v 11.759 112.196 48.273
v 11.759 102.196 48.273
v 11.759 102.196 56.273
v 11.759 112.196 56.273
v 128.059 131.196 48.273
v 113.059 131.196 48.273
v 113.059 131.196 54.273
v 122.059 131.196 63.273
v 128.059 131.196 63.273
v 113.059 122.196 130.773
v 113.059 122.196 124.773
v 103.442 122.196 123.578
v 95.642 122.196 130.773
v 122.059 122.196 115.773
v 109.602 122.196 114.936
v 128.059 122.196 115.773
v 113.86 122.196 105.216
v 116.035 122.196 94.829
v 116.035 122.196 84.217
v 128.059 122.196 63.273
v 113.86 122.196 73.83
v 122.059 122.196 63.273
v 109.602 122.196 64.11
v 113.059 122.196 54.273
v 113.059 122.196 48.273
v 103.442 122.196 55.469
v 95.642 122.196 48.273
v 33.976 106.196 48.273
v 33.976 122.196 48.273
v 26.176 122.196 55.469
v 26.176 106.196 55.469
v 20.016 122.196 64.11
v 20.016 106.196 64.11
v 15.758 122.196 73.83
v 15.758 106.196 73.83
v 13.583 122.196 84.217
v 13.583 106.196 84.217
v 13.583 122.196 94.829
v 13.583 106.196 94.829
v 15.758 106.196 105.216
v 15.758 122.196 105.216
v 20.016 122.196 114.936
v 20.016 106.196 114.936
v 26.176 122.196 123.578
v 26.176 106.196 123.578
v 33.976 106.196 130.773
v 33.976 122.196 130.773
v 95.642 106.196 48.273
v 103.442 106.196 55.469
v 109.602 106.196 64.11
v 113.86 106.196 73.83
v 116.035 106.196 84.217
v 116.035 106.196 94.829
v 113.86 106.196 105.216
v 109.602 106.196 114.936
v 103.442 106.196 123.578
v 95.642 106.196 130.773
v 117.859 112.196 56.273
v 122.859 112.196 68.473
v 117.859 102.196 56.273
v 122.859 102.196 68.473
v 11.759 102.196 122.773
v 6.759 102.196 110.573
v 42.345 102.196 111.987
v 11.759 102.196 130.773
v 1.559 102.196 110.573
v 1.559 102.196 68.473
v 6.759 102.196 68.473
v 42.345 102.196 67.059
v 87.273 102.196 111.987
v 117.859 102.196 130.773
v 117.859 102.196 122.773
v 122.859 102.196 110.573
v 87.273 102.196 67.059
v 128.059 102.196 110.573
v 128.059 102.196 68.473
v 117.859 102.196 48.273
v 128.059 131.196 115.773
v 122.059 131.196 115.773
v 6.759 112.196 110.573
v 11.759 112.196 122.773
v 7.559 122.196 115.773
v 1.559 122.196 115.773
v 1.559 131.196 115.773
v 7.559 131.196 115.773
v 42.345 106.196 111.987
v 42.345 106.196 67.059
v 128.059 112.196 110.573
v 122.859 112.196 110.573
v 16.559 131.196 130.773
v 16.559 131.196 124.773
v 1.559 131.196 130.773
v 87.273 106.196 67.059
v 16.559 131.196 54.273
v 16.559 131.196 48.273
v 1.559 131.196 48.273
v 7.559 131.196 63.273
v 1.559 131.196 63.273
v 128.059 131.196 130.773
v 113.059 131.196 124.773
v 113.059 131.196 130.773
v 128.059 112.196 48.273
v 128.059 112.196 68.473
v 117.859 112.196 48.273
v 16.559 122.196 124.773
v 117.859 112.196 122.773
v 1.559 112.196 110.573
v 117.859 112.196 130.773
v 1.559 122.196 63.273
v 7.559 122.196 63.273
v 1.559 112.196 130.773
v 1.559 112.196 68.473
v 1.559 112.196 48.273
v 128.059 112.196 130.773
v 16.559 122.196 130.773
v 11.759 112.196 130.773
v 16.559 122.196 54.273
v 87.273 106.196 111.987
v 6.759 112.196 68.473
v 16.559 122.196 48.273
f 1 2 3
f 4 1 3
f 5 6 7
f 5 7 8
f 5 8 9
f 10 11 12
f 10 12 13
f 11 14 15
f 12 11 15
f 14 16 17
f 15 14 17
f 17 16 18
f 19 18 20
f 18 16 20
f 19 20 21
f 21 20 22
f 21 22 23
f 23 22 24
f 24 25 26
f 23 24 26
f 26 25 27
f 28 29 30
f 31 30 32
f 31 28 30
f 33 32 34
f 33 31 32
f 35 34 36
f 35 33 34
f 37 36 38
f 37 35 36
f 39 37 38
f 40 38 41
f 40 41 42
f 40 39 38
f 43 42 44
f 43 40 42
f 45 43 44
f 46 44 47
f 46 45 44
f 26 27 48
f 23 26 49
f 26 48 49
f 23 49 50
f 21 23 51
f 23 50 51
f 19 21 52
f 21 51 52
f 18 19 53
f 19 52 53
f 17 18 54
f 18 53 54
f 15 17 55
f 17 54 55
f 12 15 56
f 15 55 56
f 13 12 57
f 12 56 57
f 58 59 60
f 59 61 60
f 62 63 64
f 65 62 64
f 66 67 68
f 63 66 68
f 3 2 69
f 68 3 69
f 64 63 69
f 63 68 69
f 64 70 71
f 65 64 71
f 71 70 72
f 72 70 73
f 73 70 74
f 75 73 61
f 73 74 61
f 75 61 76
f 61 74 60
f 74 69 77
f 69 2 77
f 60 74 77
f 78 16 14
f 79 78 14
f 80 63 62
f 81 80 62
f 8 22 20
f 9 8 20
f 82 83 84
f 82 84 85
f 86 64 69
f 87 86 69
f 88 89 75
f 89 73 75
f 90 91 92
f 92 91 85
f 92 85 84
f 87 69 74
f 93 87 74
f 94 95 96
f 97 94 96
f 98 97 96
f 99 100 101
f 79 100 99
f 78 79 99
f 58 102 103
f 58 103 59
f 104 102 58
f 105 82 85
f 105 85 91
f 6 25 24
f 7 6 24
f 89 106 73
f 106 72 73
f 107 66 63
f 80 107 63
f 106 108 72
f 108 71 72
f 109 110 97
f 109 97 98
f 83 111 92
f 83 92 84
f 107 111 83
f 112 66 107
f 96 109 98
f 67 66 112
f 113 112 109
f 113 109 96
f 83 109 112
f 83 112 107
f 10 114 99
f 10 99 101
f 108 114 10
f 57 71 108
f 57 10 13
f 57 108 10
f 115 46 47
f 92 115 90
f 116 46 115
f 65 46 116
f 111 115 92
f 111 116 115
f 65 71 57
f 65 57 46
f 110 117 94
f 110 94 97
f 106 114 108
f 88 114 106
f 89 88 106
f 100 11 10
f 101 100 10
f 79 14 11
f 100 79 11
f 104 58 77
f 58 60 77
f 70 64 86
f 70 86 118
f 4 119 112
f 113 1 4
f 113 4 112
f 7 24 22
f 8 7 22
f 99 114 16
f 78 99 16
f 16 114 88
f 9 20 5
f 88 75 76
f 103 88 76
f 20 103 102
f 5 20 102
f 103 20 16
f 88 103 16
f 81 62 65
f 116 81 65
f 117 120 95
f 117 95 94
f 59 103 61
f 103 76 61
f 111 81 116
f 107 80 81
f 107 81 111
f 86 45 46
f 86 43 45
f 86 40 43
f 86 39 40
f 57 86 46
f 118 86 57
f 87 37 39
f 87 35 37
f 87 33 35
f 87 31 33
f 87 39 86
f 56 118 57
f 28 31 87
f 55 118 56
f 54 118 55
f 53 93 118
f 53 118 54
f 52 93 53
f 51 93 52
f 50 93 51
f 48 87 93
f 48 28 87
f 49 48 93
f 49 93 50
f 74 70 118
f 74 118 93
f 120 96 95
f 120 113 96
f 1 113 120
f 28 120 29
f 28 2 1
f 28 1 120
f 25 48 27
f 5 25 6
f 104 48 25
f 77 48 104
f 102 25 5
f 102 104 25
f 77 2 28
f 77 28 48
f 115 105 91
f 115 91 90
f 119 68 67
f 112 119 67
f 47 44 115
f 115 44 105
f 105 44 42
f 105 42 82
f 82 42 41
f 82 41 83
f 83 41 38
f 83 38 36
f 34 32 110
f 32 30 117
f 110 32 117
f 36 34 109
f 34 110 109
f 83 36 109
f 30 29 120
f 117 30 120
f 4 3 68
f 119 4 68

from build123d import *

# Parameters (mm, degrees)
SKETCH_1_W      = 44.92820323
SKETCH_1_H      = 44.928203231
EXTRUDE_1_DEPTH = 4
EXTRUDE_2_DEPTH = 6
EXTRUDE_3_DEPTH = 10
EXTRUDE_4_DEPTH = 9


with BuildPart() as part:
    # Эскиз1 → Бобышка-Вытянуть1 (new body)
    with BuildSketch(Plane(origin=(0, 102.195974268, 0), x_dir=(1, 0, 0), z_dir=(0, 1, 0))):
        Polygon((6.758980694, -68.473129836), (1.558980694, -68.473129836), (1.558980694, -110.573129836), (6.758980694, -110.573129836), (11.758980694, -122.773129836), (11.758980694, -130.773129836), (117.858980694, -130.773129836), (117.858980694, -122.773129836), (122.858980694, -110.573129836), (128.058980694, -110.573129836), (128.058980694, -68.473129836), (122.858980694, -68.473129836), (117.858980694, -56.273129836), (117.858980694, -48.273129836), (11.758980694, -48.273129836), (11.758980694, -56.273129836), align=None)
        with Locations((64.808980694, -89.523129837)):
            Rectangle(SKETCH_1_W, SKETCH_1_H, mode=Mode.SUBTRACT)
    extrude(amount=EXTRUDE_1_DEPTH)

    # Эскиз2 → Бобышка-Вытянуть2 (add)
    with BuildSketch(Plane(origin=(0, 106.195974268, 0), x_dir=(1, 0, 0), z_dir=(0, 1, 0))):
        with BuildLine():
            Line((95.642201414, -130.773129836), (117.858980694, -130.773129836))
            Line((117.858980694, -130.773129836), (117.858980694, -122.773129836))
            Line((117.858980694, -122.773129836), (122.858980694, -110.573129836))
            Line((122.858980694, -110.573129836), (128.058980694, -110.573129836))
            Line((128.058980694, -110.573129836), (128.058980694, -68.473129836))
            Line((128.058980694, -68.473129836), (122.858980694, -68.473129836))
            Line((122.858980694, -68.473129836), (117.858980694, -56.273129836))
            Line((117.858980694, -56.273129836), (117.858980694, -48.273129836))
            Line((117.858980694, -48.273129836), (95.642201414, -48.273129836))
            ThreePointArc((95.642201414, -48.273129836), (116.308980694, -89.523129836), (95.642201414, -130.773129836))
        make_face()
        with BuildLine():
            Line((33.975759973, -48.273129836), (11.758980694, -48.273129836))
            Line((11.758980694, -48.273129836), (11.758980694, -56.273129836))
            Line((11.758980694, -56.273129836), (6.758980694, -68.473129836))
            Line((6.758980694, -68.473129836), (1.558980694, -68.473129836))
            Line((1.558980694, -68.473129836), (1.558980694, -110.573129836))
            Line((1.558980694, -110.573129836), (6.758980694, -110.573129836))
            Line((6.758980694, -110.573129836), (11.758980694, -122.773129836))
            Line((11.758980694, -122.773129836), (11.758980694, -130.773129836))
            Line((11.758980694, -130.773129836), (33.975759973, -130.773129836))
            ThreePointArc((33.975759973, -130.773129836), (13.308980694, -89.523129836), (33.975759973, -48.273129836))
        make_face()
    extrude(amount=EXTRUDE_2_DEPTH)

    # Эскиз3 → Бобышка-Вытянуть3 (add)
    with BuildSketch(Plane(origin=(0, 112.195974268, 0), x_dir=(1, 0, 0), z_dir=(0, 1, 0))):
        with BuildLine():
            Line((1.558980694, -130.773129836), (1.558980694, -48.273129836))
            Line((1.558980694, -48.273129836), (33.975759973, -48.273129836))
            ThreePointArc((33.975759973, -48.273129836), (13.308980694, -89.523129836), (33.975759973, -130.773129836))
            Line((33.975759973, -130.773129836), (1.558980694, -130.773129836))
        make_face()
        with BuildLine():
            Line((95.642201414, -48.273129836), (128.058980694, -48.273129836))
            Line((128.058980694, -48.273129836), (128.058980694, -130.773129836))
            Line((128.058980694, -130.773129836), (95.642201414, -130.773129836))
            ThreePointArc((95.642201414, -130.773129836), (116.308980694, -89.523129836), (95.642201414, -48.273129836))
        make_face()
    extrude(amount=EXTRUDE_3_DEPTH)

    # Эскиз4 → Бобышка-Вытянуть4 (add)
    with BuildSketch(Plane(origin=(0, 122.195974268, 0), x_dir=(1, 0, 0), z_dir=(0, 1, 0))):
        Polygon((1.558980694, -48.273129836), (16.558980694, -48.273129836), (16.558980694, -54.273129836), (7.558980694, -63.273129836), (1.558980694, -63.273129836), align=None)
        Polygon((128.058980694, -48.273129836), (113.058980694, -48.273129836), (113.058980694, -54.273129836), (122.058980694, -63.273129836), (128.058980694, -63.273129836), align=None)
        Polygon((128.058980694, -130.773129836), (128.058980694, -115.773129836), (122.058980694, -115.773129836), (113.058980694, -124.773129836), (113.058980694, -130.773129836), align=None)
        Polygon((1.558980694, -130.773129836), (1.558980694, -115.773129836), (7.558980694, -115.773129836), (16.558980694, -124.773129836), (16.558980694, -130.773129836), align=None)
    extrude(amount=EXTRUDE_4_DEPTH)


solid = part.part
